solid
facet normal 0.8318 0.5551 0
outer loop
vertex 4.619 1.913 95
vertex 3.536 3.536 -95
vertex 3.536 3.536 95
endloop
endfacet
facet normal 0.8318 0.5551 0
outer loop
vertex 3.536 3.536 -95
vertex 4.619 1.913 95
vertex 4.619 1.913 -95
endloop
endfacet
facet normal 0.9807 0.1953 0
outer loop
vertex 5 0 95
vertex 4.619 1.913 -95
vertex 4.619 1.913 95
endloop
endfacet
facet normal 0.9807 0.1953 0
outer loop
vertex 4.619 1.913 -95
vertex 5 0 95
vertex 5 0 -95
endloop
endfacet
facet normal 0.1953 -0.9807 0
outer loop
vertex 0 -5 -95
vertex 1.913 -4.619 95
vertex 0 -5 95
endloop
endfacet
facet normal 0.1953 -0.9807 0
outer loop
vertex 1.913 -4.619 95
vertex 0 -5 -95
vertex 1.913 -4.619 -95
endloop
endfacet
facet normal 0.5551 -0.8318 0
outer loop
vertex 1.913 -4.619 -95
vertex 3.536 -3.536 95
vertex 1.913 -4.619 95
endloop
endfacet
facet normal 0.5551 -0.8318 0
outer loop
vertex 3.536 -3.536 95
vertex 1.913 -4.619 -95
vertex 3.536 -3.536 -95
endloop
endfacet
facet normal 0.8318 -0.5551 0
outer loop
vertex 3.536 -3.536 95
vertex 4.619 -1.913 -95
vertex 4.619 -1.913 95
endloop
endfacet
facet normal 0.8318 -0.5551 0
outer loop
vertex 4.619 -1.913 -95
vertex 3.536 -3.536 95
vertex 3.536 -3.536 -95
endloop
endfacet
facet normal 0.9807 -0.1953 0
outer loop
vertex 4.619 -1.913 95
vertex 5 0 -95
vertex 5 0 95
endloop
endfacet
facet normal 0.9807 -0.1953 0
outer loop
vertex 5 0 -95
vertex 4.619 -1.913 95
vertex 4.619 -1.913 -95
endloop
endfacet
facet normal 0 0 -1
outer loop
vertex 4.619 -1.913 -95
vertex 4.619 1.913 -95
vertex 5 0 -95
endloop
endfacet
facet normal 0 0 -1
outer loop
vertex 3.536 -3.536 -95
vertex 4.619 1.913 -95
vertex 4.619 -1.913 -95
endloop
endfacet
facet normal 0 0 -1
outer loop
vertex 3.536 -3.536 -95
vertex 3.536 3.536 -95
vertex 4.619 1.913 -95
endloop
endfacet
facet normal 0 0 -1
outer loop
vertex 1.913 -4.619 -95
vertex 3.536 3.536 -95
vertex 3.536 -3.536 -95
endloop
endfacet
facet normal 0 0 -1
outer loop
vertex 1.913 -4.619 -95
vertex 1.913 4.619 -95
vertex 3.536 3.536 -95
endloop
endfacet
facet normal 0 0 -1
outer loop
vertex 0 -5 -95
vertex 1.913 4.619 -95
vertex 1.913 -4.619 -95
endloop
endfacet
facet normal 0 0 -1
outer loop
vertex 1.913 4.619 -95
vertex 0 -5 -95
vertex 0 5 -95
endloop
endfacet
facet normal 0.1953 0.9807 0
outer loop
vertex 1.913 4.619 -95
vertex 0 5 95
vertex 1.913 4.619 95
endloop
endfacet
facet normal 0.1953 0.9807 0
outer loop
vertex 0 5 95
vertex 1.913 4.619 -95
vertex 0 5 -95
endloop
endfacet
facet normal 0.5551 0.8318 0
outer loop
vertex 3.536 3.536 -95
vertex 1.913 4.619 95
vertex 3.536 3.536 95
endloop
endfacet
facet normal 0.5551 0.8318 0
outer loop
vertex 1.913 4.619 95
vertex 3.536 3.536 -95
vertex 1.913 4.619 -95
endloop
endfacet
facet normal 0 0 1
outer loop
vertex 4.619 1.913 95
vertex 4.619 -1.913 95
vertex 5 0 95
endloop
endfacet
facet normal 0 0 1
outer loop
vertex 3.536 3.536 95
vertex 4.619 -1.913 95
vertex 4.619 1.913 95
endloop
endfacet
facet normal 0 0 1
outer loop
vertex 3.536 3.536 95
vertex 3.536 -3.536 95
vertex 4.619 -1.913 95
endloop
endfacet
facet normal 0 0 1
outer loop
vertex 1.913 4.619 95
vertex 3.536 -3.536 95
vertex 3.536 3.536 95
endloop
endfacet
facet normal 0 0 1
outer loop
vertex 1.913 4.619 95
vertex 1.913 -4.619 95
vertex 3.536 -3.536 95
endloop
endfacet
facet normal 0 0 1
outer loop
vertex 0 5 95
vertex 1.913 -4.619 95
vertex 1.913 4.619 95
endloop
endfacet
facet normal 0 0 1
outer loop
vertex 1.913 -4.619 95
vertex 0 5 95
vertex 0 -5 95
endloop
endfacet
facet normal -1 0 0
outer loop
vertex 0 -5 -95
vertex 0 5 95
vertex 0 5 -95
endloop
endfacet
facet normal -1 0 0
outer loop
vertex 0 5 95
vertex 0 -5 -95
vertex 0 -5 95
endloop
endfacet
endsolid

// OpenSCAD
module cylindrical_pole()
{
    difference()
    {
        cylinder(h = 190, r = 5, center = true);

        translate([ -5, 0, 0 ]) cube([ 10, 10, 195 ], center = true);
    }
}

cylindrical_pole();
